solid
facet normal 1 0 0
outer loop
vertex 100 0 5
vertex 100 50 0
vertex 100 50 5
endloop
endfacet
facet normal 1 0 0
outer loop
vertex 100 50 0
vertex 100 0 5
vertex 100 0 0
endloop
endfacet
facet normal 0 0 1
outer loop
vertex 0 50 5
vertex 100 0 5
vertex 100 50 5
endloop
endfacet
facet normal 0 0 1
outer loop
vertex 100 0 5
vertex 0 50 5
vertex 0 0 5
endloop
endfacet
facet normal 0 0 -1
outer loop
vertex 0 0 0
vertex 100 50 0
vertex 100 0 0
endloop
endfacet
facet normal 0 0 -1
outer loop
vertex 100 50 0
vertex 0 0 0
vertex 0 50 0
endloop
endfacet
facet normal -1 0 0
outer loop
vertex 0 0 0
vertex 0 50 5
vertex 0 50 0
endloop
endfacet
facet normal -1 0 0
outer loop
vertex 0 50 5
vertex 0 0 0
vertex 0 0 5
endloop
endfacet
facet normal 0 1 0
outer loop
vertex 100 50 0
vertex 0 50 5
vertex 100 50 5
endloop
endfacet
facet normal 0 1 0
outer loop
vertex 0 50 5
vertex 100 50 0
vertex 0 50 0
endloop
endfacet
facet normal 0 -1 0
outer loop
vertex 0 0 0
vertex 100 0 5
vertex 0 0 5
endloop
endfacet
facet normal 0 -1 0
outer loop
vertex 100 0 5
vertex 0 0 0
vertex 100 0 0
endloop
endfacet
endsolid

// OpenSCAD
// dimensions in millimeter [width, depth, height]
plate = [100, 50, 5];

hole_dm = 6;
hole_margin = 4;

cube(plate);

translate([
    hole_margin + hole_dm / 2,
    hole_margin + hole_dm / 2,
    0
])
color( "red" )
cylinder( h = plate.z, d = hole_dm);

//echo(plate.x, plate.y, plate.z);
//echo(plate[0], plate[1], plate[2]);
